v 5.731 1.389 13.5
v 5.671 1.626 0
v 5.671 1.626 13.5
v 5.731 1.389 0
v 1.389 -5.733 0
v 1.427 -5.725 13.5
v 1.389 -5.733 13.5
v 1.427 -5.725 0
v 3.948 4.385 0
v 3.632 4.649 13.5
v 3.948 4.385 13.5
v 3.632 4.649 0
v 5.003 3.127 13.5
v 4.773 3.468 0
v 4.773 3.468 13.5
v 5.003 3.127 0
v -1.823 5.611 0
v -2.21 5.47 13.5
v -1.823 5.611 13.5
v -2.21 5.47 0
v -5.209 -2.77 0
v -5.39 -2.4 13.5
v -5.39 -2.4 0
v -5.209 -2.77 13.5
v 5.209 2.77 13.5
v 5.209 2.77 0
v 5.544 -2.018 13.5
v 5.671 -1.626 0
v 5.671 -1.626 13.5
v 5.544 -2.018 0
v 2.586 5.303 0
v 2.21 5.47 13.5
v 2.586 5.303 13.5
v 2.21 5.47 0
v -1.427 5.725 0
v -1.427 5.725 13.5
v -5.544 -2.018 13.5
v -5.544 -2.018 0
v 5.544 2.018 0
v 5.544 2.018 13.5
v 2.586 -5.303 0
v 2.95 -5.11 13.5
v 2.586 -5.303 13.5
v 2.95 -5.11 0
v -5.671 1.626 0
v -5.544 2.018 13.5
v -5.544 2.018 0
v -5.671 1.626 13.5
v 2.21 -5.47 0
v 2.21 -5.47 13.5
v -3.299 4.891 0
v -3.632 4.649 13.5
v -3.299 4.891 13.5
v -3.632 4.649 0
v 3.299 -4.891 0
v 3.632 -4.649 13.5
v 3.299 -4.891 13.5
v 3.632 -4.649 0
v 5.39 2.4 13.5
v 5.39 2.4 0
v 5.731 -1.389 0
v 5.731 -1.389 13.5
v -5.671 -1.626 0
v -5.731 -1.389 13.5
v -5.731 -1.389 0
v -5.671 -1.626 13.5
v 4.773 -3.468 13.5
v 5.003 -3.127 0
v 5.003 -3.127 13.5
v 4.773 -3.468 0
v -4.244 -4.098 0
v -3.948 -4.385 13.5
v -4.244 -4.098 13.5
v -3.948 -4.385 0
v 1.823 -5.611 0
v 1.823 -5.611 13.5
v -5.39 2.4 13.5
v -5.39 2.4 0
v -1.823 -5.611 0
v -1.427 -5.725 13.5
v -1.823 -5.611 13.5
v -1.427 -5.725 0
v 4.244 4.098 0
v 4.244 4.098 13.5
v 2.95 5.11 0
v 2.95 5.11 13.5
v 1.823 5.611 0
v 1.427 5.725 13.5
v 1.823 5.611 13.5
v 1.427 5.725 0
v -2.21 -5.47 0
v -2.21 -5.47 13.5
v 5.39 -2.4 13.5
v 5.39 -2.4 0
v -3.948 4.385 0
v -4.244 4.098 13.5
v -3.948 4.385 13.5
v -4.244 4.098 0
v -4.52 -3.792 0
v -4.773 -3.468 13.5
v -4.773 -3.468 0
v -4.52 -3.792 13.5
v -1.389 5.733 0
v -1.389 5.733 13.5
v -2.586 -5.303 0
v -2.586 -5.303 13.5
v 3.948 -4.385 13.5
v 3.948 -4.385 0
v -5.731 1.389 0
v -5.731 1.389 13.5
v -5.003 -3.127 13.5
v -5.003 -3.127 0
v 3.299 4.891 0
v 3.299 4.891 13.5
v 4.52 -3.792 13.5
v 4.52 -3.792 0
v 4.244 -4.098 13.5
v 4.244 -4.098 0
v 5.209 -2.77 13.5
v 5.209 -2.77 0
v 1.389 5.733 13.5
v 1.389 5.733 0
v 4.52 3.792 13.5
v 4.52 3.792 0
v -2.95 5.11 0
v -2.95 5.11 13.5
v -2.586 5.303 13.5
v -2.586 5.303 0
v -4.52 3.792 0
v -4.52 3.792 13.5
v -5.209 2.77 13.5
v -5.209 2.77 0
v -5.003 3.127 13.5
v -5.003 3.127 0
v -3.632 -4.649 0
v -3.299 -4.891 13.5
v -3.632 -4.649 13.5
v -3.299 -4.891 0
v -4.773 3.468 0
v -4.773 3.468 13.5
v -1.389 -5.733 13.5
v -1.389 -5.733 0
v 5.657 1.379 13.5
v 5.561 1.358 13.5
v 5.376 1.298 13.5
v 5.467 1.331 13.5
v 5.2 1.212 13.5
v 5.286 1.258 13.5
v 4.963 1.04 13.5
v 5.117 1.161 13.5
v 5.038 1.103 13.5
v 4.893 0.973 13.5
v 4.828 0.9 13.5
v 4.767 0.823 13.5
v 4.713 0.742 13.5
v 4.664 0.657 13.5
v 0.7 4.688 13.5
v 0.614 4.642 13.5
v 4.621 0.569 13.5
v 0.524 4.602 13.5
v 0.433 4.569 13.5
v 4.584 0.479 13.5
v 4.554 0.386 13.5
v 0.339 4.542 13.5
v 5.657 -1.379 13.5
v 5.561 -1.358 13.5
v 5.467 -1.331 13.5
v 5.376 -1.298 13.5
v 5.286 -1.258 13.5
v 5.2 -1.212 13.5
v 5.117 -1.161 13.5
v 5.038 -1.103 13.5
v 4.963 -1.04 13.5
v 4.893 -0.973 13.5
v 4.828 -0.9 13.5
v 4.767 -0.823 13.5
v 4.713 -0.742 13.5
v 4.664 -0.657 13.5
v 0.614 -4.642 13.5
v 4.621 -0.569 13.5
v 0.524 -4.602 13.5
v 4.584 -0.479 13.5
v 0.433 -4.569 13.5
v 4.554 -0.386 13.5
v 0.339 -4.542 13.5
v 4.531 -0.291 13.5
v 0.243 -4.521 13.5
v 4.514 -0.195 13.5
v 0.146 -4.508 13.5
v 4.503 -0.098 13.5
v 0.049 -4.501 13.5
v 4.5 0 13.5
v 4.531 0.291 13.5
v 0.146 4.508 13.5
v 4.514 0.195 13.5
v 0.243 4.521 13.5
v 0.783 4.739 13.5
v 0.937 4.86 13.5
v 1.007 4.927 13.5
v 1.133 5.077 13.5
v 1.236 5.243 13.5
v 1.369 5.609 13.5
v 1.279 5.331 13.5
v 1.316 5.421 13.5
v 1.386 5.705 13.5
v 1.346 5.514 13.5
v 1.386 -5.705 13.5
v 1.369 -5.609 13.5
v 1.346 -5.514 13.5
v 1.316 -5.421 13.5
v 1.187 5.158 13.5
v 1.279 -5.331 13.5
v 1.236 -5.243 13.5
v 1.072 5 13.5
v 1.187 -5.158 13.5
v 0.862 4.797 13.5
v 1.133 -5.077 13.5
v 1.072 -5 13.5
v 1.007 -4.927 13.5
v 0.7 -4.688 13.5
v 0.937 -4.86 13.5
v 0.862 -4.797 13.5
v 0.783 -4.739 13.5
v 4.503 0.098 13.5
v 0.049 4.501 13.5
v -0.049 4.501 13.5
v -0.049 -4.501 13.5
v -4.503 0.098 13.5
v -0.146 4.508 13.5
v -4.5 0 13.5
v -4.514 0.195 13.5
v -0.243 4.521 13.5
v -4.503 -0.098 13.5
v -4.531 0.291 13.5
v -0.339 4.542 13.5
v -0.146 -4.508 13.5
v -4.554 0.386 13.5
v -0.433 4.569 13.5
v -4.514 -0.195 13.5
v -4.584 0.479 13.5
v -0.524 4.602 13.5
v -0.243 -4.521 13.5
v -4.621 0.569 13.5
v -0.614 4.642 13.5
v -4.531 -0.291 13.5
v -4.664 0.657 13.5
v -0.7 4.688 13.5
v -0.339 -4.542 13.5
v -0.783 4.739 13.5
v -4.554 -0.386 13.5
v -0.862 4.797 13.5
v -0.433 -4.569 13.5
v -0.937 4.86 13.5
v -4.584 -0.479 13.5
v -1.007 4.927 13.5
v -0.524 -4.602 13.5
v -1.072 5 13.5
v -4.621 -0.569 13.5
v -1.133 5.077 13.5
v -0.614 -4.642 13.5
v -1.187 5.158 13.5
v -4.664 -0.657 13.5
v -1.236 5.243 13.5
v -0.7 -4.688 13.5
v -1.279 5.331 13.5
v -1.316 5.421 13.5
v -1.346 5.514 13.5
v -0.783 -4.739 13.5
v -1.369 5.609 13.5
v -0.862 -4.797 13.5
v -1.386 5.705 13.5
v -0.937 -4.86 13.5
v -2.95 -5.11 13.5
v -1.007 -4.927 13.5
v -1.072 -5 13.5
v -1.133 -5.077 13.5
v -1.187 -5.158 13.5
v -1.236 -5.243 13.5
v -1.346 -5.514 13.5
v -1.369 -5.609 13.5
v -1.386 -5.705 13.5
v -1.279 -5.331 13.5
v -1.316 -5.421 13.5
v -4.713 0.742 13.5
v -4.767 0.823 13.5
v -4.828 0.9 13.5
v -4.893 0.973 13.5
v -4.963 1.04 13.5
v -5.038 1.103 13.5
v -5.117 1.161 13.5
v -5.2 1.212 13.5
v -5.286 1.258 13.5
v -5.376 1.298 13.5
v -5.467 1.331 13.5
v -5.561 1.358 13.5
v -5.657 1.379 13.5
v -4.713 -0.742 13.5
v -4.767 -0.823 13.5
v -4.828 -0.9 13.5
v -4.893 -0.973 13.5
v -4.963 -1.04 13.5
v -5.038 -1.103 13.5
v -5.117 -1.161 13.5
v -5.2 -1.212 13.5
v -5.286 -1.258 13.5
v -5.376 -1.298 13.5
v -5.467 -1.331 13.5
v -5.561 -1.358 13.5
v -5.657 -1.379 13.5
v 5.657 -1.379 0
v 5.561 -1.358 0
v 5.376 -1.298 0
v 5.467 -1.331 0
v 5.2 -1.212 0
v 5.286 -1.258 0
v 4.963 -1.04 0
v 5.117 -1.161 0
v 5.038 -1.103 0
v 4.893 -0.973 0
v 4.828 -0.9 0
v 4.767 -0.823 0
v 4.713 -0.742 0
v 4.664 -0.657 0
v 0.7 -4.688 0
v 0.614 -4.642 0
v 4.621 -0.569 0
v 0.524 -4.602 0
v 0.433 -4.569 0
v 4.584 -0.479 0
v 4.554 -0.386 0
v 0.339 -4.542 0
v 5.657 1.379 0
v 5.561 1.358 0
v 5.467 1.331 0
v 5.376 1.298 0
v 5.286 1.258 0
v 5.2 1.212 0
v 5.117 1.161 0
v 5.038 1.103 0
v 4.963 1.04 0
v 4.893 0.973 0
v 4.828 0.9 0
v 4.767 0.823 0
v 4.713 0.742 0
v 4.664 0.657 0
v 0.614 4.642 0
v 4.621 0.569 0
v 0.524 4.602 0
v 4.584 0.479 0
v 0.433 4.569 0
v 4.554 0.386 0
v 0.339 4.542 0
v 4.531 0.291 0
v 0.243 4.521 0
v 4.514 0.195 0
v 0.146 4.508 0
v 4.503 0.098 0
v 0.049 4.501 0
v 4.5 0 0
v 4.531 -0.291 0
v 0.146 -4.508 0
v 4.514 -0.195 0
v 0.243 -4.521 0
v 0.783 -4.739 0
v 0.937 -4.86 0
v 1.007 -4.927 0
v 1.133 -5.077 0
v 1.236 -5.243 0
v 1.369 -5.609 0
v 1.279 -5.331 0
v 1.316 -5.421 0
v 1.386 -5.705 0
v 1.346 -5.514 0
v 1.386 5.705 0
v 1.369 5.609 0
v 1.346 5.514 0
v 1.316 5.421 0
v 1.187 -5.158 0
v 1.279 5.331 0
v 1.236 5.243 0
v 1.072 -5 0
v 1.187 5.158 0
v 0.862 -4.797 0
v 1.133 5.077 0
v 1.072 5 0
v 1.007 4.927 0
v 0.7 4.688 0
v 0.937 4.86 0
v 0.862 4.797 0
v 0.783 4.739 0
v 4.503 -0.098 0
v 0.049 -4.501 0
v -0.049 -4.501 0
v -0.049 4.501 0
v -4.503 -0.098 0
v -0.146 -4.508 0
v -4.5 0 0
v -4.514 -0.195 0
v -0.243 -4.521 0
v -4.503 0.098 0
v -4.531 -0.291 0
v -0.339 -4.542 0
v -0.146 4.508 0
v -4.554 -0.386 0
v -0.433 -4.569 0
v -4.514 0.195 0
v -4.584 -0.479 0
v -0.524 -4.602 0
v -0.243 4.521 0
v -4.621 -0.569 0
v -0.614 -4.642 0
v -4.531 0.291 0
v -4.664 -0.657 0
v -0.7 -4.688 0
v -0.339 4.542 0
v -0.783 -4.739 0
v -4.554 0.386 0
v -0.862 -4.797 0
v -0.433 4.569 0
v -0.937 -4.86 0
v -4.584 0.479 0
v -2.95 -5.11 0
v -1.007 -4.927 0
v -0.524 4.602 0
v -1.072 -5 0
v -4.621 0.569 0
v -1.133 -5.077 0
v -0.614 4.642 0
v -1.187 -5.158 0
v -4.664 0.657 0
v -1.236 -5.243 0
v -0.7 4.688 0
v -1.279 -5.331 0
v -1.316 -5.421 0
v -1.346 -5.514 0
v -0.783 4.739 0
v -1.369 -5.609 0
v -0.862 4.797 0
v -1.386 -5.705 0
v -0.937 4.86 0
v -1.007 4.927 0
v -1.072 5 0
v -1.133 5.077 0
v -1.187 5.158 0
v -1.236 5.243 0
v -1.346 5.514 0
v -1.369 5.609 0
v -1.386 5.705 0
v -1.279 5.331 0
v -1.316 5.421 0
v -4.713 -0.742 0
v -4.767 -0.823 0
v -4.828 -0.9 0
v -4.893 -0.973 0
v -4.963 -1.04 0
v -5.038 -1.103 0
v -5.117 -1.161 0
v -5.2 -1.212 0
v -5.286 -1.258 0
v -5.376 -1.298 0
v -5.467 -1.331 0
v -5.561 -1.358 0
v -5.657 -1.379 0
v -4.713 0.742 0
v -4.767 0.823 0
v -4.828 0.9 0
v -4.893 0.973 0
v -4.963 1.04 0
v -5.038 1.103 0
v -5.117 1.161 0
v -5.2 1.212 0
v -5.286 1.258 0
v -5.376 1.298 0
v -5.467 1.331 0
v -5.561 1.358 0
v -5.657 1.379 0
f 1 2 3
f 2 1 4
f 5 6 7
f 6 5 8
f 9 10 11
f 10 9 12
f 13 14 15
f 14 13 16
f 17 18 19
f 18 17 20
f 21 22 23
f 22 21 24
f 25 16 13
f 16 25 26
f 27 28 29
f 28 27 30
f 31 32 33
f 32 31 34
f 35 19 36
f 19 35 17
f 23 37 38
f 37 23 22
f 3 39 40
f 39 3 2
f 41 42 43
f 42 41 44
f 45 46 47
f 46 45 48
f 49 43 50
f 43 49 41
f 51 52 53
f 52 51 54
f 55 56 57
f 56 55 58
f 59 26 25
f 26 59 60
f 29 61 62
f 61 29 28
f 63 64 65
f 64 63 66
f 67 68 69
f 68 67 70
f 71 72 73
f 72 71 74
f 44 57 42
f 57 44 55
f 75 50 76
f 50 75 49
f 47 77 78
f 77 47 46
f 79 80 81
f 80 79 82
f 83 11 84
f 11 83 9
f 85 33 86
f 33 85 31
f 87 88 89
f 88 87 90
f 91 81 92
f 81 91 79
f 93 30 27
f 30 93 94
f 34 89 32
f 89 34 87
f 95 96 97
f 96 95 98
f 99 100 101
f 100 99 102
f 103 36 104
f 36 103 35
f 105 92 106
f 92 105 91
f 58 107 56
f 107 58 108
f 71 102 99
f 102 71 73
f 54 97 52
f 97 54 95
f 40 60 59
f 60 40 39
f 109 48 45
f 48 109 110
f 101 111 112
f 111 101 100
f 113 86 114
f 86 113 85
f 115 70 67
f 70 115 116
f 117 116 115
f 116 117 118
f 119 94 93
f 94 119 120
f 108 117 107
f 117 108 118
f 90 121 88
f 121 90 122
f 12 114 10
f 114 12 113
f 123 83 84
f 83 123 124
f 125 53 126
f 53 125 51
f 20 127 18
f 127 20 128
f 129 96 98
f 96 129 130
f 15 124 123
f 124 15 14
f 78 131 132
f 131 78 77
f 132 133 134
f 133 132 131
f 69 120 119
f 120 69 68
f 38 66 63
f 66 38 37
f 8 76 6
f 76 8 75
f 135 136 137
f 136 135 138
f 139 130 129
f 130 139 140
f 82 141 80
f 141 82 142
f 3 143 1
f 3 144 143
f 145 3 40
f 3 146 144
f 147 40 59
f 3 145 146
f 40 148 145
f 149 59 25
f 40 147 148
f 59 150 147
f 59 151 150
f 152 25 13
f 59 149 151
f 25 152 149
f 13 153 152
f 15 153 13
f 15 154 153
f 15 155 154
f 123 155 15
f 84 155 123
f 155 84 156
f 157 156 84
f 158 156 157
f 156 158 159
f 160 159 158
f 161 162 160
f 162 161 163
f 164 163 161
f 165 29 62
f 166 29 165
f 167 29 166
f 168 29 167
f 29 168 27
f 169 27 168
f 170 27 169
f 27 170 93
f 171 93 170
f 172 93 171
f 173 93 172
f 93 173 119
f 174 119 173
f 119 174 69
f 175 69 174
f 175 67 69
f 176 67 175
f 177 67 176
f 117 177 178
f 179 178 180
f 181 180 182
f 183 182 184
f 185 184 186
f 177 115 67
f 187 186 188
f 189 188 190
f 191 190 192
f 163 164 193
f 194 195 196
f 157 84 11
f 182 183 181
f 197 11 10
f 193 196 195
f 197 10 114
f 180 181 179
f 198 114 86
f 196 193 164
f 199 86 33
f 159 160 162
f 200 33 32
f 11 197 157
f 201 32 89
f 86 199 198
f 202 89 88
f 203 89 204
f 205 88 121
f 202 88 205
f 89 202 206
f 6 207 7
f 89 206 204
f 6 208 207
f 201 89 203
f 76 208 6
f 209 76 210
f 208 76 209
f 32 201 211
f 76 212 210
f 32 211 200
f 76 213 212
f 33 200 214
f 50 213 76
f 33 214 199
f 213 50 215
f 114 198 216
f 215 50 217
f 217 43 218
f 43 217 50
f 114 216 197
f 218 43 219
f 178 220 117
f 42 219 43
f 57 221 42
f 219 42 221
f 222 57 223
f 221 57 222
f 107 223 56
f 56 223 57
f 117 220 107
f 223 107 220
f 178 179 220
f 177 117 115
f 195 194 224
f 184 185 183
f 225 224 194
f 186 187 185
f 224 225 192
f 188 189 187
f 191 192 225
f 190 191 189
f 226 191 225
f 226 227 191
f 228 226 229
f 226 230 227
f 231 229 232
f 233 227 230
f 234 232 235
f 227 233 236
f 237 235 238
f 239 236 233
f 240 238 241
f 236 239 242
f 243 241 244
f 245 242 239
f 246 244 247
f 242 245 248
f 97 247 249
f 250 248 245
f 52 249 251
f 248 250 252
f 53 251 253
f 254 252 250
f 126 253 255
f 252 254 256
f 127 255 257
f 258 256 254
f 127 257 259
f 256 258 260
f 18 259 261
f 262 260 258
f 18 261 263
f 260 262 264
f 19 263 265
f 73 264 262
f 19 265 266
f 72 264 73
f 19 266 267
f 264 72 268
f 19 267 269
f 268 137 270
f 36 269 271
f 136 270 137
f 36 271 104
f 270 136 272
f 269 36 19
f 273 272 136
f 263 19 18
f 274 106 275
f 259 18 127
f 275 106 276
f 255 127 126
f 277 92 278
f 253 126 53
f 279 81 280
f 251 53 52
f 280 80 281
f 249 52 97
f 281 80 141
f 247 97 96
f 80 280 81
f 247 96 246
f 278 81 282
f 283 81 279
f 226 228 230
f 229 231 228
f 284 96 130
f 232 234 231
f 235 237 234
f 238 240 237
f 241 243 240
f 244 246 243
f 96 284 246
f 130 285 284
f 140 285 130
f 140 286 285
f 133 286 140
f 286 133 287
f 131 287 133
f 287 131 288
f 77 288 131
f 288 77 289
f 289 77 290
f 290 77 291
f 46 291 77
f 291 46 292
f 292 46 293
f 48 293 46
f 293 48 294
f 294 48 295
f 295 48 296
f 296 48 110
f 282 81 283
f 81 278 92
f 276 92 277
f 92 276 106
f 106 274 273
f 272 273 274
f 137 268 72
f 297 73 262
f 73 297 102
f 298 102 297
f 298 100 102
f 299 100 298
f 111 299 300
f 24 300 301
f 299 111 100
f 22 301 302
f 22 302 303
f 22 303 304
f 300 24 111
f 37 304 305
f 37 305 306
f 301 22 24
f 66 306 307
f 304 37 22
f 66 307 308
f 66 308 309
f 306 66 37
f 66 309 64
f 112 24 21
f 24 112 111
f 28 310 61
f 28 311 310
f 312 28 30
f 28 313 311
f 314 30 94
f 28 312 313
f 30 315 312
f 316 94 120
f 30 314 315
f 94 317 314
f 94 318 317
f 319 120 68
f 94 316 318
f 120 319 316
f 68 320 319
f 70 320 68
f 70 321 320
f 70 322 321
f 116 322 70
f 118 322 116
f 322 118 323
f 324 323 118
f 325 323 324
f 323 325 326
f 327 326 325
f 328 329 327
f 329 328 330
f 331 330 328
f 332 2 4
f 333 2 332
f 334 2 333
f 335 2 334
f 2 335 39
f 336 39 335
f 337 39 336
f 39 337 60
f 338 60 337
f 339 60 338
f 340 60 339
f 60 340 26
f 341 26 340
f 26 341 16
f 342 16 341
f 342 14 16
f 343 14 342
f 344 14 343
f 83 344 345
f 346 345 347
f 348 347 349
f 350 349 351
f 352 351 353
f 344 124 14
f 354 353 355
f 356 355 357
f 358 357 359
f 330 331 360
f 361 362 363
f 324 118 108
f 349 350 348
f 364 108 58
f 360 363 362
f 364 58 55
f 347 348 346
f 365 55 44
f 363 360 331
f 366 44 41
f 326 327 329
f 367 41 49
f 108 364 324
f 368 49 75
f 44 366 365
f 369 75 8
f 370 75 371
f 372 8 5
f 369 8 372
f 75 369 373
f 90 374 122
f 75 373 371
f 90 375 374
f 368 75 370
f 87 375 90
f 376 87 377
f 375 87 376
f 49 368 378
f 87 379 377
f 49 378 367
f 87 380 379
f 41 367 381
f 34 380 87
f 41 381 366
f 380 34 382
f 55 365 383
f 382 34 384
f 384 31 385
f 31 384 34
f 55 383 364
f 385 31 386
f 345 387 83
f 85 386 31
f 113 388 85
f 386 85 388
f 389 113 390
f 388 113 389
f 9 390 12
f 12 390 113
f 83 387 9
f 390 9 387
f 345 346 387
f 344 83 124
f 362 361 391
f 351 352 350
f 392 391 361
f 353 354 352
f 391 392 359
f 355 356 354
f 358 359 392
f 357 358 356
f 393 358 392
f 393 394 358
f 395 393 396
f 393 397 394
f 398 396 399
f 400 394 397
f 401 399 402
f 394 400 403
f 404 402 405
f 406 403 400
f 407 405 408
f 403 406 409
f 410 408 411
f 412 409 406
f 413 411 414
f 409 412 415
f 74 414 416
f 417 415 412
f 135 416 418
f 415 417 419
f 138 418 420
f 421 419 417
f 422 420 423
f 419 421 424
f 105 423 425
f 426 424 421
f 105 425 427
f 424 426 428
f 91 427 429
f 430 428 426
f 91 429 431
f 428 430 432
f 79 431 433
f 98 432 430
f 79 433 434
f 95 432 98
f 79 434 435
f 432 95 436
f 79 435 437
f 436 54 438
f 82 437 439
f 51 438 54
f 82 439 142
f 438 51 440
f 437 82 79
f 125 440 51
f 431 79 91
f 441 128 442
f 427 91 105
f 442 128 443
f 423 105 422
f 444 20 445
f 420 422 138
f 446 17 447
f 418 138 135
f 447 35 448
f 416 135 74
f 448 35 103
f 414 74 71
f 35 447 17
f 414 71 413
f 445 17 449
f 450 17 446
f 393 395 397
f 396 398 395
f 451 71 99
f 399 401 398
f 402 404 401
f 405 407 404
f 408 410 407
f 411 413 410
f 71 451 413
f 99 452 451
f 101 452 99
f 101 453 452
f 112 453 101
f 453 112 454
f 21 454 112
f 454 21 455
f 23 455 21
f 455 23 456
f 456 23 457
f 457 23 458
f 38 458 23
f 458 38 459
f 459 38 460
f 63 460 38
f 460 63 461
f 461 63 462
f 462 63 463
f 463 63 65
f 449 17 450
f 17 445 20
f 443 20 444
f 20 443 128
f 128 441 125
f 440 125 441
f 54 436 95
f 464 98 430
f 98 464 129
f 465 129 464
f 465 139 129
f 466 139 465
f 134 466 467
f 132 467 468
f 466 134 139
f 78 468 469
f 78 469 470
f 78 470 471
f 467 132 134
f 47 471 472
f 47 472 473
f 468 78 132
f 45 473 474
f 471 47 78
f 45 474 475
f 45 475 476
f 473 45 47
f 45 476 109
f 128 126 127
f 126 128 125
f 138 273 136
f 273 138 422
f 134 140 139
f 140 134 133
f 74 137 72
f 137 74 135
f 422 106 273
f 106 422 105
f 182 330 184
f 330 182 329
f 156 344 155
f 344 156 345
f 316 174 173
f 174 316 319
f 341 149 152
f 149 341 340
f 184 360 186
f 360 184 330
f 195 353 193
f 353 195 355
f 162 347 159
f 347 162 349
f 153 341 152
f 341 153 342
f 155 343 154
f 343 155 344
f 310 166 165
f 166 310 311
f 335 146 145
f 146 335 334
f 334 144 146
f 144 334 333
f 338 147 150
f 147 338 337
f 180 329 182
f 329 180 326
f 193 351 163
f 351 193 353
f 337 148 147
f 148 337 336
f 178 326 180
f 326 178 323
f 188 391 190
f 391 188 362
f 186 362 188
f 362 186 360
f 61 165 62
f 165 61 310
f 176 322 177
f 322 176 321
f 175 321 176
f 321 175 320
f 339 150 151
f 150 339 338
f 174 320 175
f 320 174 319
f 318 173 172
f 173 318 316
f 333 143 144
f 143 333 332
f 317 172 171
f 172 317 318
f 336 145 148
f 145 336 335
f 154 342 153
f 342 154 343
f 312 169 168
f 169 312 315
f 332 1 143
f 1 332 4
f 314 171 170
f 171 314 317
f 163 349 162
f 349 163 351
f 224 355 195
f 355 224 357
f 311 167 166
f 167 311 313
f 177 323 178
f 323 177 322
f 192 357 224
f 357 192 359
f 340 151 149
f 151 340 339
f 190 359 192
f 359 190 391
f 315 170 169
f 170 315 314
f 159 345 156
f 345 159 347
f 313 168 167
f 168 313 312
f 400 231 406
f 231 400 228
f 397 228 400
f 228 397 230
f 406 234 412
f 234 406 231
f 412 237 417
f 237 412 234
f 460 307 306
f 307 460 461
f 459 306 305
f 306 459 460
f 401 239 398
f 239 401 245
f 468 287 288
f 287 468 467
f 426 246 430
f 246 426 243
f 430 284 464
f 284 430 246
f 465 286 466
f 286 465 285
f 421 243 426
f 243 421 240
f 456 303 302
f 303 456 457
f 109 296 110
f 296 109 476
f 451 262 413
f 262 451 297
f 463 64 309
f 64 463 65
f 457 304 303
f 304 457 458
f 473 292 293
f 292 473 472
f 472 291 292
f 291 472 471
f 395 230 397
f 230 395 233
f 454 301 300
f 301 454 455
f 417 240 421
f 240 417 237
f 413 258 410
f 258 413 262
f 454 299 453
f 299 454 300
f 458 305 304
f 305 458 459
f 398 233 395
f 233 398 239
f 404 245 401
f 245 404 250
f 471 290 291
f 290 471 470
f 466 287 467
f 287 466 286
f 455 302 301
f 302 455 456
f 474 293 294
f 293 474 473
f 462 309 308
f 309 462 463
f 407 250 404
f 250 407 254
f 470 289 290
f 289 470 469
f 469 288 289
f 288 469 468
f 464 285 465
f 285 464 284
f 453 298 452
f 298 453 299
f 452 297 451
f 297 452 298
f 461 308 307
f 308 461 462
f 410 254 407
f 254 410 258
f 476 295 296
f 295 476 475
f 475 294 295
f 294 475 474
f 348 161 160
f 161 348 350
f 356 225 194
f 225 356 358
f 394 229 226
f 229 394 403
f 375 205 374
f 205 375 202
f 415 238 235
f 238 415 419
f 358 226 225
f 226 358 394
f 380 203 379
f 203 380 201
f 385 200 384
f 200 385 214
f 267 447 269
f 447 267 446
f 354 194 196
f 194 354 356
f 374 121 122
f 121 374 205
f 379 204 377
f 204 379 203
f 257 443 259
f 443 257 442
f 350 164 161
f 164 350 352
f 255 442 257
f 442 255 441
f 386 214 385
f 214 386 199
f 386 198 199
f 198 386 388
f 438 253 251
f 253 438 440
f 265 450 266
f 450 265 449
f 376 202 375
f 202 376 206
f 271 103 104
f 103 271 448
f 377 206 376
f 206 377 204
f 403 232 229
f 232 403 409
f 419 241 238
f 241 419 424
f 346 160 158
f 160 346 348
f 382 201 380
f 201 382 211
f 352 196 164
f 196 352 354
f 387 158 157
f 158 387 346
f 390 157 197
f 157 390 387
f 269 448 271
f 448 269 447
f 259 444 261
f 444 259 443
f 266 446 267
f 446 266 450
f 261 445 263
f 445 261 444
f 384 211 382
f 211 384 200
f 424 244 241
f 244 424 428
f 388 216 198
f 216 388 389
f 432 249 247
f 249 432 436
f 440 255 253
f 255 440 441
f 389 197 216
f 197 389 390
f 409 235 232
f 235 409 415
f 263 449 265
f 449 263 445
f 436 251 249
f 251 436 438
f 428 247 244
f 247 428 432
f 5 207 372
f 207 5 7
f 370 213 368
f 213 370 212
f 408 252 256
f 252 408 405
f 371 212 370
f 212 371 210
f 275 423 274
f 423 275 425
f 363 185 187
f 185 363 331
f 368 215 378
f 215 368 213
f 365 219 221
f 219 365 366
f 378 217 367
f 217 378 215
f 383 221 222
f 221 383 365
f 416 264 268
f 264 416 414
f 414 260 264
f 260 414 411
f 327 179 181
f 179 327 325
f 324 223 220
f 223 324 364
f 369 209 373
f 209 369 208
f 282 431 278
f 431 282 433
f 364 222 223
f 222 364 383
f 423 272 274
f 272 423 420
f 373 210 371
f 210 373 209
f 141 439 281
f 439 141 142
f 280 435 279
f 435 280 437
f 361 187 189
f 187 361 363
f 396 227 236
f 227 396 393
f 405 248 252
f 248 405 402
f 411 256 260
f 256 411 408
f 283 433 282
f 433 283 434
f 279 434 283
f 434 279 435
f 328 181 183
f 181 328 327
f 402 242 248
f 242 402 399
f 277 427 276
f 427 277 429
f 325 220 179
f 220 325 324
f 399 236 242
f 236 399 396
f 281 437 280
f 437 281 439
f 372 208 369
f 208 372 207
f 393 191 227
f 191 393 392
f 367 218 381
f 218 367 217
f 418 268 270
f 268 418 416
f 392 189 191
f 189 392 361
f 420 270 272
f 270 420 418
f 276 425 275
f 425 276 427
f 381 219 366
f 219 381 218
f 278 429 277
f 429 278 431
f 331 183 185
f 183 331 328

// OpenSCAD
//Titel
title="Lichthalter";

//Tiefe Halter (geschätzt)
th=13.5;

//Durchmesser Halter (geschätzt)
dh=11.8;

//Durchmesser Böbel (geschätzt)
db=2.8;

$fn=90;

module aussparung()
{
    cylinder(h=th, d=db);    
}

module grundelement()
{
    difference()
    {
        cylinder(h=th, d=dh);
        
        translate([dh/2,0,0])
        aussparung();
        
        translate([-dh/2,0,0])
        aussparung();
        
        translate([0,dh/2,0])
        aussparung();
        
        translate([0,-dh/2,0])
        aussparung();
    }
}

grundelement();
